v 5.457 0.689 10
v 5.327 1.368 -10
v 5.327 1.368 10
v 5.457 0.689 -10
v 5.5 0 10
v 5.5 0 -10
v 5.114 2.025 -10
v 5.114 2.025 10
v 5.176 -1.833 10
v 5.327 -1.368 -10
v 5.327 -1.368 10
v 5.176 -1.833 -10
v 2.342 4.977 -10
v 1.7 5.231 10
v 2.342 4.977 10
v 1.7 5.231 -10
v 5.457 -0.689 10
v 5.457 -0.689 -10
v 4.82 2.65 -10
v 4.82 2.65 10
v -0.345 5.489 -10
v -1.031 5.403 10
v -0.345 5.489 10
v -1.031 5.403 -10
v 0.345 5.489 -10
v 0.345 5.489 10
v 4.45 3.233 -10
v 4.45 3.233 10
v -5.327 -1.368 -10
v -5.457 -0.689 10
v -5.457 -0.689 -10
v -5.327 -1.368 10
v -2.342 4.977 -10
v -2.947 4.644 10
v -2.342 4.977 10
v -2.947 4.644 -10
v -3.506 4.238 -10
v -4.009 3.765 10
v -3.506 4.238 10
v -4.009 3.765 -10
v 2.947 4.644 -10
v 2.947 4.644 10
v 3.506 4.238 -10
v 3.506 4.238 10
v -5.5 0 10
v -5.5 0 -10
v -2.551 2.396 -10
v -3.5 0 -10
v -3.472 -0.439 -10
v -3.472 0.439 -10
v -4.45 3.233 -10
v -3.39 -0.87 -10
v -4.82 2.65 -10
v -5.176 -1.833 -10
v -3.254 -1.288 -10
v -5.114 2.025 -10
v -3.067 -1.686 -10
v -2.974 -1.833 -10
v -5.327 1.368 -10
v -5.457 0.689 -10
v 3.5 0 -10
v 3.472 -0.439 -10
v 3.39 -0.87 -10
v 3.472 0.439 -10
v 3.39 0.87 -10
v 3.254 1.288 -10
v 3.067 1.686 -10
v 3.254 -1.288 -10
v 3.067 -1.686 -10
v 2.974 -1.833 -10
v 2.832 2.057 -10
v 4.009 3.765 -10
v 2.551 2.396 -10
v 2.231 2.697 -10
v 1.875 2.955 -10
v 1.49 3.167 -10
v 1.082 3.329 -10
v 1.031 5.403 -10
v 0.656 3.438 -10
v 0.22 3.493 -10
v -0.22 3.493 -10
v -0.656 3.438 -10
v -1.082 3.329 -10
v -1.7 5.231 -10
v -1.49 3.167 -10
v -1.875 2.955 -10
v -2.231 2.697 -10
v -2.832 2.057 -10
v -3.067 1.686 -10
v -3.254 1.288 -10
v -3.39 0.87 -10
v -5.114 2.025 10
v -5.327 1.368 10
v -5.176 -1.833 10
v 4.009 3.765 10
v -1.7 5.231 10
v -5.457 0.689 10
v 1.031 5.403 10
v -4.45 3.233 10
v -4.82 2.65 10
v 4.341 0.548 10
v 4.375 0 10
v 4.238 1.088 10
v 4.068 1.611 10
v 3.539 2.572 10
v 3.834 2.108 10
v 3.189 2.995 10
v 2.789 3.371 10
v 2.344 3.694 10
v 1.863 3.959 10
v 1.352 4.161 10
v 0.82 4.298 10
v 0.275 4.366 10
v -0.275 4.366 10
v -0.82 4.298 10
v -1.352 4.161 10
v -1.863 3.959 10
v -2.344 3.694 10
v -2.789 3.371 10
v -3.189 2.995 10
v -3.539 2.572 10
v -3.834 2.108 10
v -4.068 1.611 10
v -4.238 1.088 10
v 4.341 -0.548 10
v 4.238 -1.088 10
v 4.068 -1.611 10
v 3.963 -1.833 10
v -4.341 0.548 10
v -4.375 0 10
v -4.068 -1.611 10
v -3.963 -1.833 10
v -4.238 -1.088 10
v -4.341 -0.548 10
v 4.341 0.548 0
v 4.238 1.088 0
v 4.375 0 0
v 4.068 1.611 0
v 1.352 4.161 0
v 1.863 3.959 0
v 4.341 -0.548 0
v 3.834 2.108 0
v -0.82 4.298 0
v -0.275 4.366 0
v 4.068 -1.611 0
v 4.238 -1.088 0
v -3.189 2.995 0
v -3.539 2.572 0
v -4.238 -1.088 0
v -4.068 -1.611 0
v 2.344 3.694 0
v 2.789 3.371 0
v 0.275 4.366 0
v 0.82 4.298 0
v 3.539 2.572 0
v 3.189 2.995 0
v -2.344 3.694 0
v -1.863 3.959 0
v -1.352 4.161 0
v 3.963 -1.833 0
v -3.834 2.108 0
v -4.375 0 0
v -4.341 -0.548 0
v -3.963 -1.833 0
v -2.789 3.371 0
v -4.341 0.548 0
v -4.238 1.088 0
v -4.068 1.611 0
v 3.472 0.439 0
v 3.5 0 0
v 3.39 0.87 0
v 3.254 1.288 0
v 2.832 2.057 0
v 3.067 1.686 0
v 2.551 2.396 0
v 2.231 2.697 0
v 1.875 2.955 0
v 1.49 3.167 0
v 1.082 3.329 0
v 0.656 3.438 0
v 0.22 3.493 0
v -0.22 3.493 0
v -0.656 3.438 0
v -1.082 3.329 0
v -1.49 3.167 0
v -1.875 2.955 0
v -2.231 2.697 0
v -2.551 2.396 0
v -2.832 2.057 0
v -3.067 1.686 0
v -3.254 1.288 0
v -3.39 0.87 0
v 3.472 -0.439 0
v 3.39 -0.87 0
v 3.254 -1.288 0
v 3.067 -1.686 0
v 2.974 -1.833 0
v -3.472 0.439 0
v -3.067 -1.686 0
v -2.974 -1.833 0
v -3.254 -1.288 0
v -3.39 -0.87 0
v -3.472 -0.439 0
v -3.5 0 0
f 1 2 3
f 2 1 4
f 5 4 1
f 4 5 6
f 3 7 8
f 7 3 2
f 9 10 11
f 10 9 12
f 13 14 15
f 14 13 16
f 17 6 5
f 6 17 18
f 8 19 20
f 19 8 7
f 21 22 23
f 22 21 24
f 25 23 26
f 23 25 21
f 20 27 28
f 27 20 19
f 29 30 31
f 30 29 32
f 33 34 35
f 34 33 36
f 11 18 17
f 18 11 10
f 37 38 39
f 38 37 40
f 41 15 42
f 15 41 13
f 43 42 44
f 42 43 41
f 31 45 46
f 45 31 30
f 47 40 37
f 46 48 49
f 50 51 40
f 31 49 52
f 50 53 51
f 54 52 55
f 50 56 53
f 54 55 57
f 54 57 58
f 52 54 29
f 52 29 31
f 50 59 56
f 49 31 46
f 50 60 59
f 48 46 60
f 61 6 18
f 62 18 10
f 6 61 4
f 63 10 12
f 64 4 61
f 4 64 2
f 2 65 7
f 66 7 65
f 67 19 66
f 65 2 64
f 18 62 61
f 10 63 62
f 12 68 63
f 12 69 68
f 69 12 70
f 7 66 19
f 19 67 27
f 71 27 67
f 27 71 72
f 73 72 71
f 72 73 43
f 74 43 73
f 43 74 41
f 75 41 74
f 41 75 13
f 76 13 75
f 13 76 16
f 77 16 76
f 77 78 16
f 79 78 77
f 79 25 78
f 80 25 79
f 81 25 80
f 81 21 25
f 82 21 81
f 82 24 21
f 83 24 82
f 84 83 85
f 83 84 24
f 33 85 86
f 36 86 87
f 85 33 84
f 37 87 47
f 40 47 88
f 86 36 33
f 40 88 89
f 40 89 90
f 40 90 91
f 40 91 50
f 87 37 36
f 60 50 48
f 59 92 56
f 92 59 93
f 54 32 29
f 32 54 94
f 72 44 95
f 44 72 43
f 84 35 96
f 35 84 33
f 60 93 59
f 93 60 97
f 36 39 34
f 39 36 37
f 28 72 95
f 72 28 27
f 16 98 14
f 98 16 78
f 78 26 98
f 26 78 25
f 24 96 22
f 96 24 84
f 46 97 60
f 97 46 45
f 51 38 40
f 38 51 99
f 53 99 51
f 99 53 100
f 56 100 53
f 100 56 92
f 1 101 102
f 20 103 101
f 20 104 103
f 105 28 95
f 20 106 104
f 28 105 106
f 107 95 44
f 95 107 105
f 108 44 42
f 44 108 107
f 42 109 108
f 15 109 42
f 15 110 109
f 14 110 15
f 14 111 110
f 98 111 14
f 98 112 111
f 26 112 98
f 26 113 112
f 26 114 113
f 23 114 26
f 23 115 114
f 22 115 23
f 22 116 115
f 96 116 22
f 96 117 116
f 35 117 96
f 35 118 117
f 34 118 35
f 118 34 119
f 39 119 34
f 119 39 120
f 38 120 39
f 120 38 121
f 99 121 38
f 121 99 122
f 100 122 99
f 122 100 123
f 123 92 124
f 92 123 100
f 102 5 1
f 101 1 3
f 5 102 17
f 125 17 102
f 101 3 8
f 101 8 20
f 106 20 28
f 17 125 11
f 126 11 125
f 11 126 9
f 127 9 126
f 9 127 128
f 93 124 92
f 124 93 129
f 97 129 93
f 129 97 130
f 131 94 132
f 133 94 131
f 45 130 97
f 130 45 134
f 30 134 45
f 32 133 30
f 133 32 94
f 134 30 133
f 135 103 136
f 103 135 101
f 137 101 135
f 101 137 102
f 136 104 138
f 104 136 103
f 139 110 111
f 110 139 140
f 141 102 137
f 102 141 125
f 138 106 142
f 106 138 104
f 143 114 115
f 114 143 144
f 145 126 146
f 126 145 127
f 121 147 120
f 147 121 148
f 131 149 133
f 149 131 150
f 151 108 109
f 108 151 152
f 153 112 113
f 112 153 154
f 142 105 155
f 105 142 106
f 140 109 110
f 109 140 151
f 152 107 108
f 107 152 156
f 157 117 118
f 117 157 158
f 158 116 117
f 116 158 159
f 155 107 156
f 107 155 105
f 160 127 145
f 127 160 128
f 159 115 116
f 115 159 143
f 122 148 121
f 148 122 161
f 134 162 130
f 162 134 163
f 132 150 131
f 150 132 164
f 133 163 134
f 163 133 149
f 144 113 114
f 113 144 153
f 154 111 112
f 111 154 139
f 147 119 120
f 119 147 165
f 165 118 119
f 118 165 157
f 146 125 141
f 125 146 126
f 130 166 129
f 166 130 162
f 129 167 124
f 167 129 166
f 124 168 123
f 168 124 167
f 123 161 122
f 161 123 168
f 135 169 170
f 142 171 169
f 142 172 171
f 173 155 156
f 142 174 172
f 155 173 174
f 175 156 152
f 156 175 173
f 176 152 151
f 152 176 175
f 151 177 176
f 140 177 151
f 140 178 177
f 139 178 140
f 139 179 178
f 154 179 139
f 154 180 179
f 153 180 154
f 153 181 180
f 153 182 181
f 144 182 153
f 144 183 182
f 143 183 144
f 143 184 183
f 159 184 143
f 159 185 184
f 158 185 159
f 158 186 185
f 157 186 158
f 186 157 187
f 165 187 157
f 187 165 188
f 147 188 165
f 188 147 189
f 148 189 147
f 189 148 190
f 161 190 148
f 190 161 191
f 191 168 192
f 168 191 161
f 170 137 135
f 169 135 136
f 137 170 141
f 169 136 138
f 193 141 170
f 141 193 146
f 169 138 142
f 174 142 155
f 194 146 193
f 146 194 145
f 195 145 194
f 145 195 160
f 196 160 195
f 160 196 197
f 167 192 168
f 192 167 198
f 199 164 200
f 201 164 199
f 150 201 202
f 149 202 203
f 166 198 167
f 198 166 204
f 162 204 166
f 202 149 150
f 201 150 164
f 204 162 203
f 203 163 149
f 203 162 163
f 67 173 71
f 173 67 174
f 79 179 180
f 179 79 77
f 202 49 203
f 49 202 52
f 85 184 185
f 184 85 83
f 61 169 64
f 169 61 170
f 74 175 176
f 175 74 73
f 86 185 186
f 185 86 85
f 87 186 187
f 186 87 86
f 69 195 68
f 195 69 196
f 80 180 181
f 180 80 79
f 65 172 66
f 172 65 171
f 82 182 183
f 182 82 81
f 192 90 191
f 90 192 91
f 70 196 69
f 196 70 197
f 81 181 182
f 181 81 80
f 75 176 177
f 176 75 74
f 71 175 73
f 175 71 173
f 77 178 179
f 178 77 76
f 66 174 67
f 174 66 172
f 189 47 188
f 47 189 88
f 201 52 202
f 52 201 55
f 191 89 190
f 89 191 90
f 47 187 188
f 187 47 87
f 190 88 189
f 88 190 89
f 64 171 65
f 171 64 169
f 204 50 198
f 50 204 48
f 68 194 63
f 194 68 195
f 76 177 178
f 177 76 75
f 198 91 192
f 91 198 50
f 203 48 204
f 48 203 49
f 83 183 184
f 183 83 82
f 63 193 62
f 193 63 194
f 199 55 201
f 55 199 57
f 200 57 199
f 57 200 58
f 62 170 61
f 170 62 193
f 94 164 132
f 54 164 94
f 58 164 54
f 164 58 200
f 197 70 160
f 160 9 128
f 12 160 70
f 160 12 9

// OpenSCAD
do = 11;

d1 = 8.75;
d2 = 7.0;
l = 10;

$fn = 50;

intersection(){
difference(){
    cylinder(d = do, h = l * 2, center=true);

    cylinder(d = d1, h = l);

    mirror([0,0,1])    
        cylinder(d = d2, h = l);
}

translate([0,do/3,0])
    cube(size=[do,do,l*2], center=true);
}
